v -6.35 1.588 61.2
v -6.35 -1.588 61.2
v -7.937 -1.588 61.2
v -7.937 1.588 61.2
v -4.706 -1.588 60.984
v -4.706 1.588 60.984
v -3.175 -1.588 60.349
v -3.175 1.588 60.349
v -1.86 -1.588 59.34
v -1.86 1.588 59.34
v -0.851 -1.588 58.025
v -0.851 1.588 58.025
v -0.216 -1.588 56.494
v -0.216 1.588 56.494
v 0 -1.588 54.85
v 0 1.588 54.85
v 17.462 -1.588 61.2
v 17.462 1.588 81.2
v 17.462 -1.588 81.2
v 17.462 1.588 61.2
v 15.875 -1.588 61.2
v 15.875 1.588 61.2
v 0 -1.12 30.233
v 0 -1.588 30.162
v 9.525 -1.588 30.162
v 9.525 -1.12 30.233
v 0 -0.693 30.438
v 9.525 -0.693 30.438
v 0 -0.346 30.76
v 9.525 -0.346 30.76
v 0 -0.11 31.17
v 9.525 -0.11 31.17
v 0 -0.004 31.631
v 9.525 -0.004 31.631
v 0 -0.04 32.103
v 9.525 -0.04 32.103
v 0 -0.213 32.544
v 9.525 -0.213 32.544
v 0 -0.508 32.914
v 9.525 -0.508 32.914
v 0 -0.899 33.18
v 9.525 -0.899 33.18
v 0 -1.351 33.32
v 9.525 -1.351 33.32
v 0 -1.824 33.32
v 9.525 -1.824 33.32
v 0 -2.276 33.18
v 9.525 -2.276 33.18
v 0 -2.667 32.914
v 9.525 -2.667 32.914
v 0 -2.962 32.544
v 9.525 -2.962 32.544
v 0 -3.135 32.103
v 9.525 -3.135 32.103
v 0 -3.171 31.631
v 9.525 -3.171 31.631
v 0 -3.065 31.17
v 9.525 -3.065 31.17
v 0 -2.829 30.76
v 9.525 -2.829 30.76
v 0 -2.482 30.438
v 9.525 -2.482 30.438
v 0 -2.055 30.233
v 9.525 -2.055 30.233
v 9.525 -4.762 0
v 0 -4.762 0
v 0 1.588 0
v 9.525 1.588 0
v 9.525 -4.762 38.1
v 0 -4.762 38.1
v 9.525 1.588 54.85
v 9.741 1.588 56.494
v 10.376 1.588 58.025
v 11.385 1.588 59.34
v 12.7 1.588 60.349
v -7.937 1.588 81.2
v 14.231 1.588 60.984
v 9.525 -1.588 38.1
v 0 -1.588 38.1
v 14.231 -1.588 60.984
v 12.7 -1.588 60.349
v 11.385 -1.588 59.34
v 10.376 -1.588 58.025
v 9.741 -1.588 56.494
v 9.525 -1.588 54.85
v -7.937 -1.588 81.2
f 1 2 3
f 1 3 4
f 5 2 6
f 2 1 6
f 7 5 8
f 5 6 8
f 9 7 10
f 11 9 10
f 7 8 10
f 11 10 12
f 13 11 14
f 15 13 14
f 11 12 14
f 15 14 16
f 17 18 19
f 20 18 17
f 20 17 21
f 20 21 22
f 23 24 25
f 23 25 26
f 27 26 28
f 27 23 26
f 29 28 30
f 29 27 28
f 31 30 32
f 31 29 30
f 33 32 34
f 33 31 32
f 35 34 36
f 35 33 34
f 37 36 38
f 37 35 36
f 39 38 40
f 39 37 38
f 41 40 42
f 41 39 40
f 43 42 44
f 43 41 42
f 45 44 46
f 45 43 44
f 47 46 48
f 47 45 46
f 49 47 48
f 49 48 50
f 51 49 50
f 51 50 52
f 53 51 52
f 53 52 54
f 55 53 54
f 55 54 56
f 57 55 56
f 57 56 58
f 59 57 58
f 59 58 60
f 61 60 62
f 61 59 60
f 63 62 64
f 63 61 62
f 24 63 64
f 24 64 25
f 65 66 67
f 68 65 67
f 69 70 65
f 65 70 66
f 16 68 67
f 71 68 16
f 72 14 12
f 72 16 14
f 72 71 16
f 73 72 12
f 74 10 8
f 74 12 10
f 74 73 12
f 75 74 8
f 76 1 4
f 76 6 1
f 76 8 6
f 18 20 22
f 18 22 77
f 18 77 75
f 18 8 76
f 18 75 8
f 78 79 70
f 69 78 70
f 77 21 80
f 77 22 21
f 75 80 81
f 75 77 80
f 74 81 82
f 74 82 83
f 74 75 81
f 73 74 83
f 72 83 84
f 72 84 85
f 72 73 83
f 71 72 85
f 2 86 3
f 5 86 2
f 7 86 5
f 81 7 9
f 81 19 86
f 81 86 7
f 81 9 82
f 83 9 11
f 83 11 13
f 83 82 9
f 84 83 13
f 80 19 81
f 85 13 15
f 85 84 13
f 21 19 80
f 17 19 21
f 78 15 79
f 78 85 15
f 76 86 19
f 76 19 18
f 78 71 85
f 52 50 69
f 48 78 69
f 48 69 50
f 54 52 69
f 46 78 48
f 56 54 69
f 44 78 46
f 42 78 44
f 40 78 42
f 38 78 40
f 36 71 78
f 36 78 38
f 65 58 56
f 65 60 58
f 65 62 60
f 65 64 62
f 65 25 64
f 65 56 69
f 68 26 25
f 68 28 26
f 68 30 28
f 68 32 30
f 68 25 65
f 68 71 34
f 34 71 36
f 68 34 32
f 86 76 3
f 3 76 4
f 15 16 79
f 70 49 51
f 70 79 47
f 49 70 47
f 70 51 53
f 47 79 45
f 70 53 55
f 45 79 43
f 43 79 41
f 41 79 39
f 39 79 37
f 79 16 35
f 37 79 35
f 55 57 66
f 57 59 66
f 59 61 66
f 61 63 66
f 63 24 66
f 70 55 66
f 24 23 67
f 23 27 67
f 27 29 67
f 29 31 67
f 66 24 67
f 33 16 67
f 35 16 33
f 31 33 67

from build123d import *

# Parameters (mm, degrees)
SKETCH1_R           = 1.5875
BOSS_EXTRUDE1_DEPTH = 9.525
SKETCH3_W           = 15
SKETCH3_H           = 3.175
SKETCH3_W_2         = 5
BOSS_EXTRUDE2_DEPTH = 12.7
FILLET1_R           = 6.35


with BuildPart() as part:
    # Sketch1 → Boss-Extrude1 (new body)
    with BuildSketch(Plane(origin=(0, 0, 0), x_dir=(0, 0, -1), z_dir=(1, 0, 0))):
        Polygon((0, -1.5875), (0, 1.5875), (-76.2, 1.5875), (-76.2, -1.5875), (-38.1, -1.5875), (-38.1, -4.7625), (-25.4, -4.7625), (0, -4.7625), align=None)
        with Locations((-31.75, -1.5875)):
            Circle(SKETCH1_R, mode=Mode.SUBTRACT)
        Polygon((0, -1.5875), (0, 1.5875), (-76.2, 1.5875), (-76.2, -1.5875), (-38.1, -1.5875), (-38.1, -4.7625), (-25.4, -4.7625), (0, -4.7625), align=None)
        with Locations((-31.75, -1.5875)):
            Circle(SKETCH1_R, mode=Mode.SUBTRACT)
    extrude(amount=BOSS_EXTRUDE1_DEPTH)

    # Sketch3 → Boss-Extrude2 (add, symmetric)
    with BuildSketch(Plane(origin=(4.7625, 0, 0), x_dir=(0, 0, -1), z_dir=(1, 0, 0))):
        with Locations((-68.7, 0)):
            Rectangle(SKETCH3_W, SKETCH3_H)
        with Locations((-78.7, 0)):
            Rectangle(SKETCH3_W_2, SKETCH3_H)
    extrude(amount=BOSS_EXTRUDE2_DEPTH, both=True)

    # Fillet1
    fillet1_edges = [part.edges().sort_by_distance(p)[0] for p in [
        (0, 0, 61.2),
        (9.525, 0, 61.2),
    ]]
    fillet(fillet1_edges, radius=FILLET1_R)


solid = part.part
